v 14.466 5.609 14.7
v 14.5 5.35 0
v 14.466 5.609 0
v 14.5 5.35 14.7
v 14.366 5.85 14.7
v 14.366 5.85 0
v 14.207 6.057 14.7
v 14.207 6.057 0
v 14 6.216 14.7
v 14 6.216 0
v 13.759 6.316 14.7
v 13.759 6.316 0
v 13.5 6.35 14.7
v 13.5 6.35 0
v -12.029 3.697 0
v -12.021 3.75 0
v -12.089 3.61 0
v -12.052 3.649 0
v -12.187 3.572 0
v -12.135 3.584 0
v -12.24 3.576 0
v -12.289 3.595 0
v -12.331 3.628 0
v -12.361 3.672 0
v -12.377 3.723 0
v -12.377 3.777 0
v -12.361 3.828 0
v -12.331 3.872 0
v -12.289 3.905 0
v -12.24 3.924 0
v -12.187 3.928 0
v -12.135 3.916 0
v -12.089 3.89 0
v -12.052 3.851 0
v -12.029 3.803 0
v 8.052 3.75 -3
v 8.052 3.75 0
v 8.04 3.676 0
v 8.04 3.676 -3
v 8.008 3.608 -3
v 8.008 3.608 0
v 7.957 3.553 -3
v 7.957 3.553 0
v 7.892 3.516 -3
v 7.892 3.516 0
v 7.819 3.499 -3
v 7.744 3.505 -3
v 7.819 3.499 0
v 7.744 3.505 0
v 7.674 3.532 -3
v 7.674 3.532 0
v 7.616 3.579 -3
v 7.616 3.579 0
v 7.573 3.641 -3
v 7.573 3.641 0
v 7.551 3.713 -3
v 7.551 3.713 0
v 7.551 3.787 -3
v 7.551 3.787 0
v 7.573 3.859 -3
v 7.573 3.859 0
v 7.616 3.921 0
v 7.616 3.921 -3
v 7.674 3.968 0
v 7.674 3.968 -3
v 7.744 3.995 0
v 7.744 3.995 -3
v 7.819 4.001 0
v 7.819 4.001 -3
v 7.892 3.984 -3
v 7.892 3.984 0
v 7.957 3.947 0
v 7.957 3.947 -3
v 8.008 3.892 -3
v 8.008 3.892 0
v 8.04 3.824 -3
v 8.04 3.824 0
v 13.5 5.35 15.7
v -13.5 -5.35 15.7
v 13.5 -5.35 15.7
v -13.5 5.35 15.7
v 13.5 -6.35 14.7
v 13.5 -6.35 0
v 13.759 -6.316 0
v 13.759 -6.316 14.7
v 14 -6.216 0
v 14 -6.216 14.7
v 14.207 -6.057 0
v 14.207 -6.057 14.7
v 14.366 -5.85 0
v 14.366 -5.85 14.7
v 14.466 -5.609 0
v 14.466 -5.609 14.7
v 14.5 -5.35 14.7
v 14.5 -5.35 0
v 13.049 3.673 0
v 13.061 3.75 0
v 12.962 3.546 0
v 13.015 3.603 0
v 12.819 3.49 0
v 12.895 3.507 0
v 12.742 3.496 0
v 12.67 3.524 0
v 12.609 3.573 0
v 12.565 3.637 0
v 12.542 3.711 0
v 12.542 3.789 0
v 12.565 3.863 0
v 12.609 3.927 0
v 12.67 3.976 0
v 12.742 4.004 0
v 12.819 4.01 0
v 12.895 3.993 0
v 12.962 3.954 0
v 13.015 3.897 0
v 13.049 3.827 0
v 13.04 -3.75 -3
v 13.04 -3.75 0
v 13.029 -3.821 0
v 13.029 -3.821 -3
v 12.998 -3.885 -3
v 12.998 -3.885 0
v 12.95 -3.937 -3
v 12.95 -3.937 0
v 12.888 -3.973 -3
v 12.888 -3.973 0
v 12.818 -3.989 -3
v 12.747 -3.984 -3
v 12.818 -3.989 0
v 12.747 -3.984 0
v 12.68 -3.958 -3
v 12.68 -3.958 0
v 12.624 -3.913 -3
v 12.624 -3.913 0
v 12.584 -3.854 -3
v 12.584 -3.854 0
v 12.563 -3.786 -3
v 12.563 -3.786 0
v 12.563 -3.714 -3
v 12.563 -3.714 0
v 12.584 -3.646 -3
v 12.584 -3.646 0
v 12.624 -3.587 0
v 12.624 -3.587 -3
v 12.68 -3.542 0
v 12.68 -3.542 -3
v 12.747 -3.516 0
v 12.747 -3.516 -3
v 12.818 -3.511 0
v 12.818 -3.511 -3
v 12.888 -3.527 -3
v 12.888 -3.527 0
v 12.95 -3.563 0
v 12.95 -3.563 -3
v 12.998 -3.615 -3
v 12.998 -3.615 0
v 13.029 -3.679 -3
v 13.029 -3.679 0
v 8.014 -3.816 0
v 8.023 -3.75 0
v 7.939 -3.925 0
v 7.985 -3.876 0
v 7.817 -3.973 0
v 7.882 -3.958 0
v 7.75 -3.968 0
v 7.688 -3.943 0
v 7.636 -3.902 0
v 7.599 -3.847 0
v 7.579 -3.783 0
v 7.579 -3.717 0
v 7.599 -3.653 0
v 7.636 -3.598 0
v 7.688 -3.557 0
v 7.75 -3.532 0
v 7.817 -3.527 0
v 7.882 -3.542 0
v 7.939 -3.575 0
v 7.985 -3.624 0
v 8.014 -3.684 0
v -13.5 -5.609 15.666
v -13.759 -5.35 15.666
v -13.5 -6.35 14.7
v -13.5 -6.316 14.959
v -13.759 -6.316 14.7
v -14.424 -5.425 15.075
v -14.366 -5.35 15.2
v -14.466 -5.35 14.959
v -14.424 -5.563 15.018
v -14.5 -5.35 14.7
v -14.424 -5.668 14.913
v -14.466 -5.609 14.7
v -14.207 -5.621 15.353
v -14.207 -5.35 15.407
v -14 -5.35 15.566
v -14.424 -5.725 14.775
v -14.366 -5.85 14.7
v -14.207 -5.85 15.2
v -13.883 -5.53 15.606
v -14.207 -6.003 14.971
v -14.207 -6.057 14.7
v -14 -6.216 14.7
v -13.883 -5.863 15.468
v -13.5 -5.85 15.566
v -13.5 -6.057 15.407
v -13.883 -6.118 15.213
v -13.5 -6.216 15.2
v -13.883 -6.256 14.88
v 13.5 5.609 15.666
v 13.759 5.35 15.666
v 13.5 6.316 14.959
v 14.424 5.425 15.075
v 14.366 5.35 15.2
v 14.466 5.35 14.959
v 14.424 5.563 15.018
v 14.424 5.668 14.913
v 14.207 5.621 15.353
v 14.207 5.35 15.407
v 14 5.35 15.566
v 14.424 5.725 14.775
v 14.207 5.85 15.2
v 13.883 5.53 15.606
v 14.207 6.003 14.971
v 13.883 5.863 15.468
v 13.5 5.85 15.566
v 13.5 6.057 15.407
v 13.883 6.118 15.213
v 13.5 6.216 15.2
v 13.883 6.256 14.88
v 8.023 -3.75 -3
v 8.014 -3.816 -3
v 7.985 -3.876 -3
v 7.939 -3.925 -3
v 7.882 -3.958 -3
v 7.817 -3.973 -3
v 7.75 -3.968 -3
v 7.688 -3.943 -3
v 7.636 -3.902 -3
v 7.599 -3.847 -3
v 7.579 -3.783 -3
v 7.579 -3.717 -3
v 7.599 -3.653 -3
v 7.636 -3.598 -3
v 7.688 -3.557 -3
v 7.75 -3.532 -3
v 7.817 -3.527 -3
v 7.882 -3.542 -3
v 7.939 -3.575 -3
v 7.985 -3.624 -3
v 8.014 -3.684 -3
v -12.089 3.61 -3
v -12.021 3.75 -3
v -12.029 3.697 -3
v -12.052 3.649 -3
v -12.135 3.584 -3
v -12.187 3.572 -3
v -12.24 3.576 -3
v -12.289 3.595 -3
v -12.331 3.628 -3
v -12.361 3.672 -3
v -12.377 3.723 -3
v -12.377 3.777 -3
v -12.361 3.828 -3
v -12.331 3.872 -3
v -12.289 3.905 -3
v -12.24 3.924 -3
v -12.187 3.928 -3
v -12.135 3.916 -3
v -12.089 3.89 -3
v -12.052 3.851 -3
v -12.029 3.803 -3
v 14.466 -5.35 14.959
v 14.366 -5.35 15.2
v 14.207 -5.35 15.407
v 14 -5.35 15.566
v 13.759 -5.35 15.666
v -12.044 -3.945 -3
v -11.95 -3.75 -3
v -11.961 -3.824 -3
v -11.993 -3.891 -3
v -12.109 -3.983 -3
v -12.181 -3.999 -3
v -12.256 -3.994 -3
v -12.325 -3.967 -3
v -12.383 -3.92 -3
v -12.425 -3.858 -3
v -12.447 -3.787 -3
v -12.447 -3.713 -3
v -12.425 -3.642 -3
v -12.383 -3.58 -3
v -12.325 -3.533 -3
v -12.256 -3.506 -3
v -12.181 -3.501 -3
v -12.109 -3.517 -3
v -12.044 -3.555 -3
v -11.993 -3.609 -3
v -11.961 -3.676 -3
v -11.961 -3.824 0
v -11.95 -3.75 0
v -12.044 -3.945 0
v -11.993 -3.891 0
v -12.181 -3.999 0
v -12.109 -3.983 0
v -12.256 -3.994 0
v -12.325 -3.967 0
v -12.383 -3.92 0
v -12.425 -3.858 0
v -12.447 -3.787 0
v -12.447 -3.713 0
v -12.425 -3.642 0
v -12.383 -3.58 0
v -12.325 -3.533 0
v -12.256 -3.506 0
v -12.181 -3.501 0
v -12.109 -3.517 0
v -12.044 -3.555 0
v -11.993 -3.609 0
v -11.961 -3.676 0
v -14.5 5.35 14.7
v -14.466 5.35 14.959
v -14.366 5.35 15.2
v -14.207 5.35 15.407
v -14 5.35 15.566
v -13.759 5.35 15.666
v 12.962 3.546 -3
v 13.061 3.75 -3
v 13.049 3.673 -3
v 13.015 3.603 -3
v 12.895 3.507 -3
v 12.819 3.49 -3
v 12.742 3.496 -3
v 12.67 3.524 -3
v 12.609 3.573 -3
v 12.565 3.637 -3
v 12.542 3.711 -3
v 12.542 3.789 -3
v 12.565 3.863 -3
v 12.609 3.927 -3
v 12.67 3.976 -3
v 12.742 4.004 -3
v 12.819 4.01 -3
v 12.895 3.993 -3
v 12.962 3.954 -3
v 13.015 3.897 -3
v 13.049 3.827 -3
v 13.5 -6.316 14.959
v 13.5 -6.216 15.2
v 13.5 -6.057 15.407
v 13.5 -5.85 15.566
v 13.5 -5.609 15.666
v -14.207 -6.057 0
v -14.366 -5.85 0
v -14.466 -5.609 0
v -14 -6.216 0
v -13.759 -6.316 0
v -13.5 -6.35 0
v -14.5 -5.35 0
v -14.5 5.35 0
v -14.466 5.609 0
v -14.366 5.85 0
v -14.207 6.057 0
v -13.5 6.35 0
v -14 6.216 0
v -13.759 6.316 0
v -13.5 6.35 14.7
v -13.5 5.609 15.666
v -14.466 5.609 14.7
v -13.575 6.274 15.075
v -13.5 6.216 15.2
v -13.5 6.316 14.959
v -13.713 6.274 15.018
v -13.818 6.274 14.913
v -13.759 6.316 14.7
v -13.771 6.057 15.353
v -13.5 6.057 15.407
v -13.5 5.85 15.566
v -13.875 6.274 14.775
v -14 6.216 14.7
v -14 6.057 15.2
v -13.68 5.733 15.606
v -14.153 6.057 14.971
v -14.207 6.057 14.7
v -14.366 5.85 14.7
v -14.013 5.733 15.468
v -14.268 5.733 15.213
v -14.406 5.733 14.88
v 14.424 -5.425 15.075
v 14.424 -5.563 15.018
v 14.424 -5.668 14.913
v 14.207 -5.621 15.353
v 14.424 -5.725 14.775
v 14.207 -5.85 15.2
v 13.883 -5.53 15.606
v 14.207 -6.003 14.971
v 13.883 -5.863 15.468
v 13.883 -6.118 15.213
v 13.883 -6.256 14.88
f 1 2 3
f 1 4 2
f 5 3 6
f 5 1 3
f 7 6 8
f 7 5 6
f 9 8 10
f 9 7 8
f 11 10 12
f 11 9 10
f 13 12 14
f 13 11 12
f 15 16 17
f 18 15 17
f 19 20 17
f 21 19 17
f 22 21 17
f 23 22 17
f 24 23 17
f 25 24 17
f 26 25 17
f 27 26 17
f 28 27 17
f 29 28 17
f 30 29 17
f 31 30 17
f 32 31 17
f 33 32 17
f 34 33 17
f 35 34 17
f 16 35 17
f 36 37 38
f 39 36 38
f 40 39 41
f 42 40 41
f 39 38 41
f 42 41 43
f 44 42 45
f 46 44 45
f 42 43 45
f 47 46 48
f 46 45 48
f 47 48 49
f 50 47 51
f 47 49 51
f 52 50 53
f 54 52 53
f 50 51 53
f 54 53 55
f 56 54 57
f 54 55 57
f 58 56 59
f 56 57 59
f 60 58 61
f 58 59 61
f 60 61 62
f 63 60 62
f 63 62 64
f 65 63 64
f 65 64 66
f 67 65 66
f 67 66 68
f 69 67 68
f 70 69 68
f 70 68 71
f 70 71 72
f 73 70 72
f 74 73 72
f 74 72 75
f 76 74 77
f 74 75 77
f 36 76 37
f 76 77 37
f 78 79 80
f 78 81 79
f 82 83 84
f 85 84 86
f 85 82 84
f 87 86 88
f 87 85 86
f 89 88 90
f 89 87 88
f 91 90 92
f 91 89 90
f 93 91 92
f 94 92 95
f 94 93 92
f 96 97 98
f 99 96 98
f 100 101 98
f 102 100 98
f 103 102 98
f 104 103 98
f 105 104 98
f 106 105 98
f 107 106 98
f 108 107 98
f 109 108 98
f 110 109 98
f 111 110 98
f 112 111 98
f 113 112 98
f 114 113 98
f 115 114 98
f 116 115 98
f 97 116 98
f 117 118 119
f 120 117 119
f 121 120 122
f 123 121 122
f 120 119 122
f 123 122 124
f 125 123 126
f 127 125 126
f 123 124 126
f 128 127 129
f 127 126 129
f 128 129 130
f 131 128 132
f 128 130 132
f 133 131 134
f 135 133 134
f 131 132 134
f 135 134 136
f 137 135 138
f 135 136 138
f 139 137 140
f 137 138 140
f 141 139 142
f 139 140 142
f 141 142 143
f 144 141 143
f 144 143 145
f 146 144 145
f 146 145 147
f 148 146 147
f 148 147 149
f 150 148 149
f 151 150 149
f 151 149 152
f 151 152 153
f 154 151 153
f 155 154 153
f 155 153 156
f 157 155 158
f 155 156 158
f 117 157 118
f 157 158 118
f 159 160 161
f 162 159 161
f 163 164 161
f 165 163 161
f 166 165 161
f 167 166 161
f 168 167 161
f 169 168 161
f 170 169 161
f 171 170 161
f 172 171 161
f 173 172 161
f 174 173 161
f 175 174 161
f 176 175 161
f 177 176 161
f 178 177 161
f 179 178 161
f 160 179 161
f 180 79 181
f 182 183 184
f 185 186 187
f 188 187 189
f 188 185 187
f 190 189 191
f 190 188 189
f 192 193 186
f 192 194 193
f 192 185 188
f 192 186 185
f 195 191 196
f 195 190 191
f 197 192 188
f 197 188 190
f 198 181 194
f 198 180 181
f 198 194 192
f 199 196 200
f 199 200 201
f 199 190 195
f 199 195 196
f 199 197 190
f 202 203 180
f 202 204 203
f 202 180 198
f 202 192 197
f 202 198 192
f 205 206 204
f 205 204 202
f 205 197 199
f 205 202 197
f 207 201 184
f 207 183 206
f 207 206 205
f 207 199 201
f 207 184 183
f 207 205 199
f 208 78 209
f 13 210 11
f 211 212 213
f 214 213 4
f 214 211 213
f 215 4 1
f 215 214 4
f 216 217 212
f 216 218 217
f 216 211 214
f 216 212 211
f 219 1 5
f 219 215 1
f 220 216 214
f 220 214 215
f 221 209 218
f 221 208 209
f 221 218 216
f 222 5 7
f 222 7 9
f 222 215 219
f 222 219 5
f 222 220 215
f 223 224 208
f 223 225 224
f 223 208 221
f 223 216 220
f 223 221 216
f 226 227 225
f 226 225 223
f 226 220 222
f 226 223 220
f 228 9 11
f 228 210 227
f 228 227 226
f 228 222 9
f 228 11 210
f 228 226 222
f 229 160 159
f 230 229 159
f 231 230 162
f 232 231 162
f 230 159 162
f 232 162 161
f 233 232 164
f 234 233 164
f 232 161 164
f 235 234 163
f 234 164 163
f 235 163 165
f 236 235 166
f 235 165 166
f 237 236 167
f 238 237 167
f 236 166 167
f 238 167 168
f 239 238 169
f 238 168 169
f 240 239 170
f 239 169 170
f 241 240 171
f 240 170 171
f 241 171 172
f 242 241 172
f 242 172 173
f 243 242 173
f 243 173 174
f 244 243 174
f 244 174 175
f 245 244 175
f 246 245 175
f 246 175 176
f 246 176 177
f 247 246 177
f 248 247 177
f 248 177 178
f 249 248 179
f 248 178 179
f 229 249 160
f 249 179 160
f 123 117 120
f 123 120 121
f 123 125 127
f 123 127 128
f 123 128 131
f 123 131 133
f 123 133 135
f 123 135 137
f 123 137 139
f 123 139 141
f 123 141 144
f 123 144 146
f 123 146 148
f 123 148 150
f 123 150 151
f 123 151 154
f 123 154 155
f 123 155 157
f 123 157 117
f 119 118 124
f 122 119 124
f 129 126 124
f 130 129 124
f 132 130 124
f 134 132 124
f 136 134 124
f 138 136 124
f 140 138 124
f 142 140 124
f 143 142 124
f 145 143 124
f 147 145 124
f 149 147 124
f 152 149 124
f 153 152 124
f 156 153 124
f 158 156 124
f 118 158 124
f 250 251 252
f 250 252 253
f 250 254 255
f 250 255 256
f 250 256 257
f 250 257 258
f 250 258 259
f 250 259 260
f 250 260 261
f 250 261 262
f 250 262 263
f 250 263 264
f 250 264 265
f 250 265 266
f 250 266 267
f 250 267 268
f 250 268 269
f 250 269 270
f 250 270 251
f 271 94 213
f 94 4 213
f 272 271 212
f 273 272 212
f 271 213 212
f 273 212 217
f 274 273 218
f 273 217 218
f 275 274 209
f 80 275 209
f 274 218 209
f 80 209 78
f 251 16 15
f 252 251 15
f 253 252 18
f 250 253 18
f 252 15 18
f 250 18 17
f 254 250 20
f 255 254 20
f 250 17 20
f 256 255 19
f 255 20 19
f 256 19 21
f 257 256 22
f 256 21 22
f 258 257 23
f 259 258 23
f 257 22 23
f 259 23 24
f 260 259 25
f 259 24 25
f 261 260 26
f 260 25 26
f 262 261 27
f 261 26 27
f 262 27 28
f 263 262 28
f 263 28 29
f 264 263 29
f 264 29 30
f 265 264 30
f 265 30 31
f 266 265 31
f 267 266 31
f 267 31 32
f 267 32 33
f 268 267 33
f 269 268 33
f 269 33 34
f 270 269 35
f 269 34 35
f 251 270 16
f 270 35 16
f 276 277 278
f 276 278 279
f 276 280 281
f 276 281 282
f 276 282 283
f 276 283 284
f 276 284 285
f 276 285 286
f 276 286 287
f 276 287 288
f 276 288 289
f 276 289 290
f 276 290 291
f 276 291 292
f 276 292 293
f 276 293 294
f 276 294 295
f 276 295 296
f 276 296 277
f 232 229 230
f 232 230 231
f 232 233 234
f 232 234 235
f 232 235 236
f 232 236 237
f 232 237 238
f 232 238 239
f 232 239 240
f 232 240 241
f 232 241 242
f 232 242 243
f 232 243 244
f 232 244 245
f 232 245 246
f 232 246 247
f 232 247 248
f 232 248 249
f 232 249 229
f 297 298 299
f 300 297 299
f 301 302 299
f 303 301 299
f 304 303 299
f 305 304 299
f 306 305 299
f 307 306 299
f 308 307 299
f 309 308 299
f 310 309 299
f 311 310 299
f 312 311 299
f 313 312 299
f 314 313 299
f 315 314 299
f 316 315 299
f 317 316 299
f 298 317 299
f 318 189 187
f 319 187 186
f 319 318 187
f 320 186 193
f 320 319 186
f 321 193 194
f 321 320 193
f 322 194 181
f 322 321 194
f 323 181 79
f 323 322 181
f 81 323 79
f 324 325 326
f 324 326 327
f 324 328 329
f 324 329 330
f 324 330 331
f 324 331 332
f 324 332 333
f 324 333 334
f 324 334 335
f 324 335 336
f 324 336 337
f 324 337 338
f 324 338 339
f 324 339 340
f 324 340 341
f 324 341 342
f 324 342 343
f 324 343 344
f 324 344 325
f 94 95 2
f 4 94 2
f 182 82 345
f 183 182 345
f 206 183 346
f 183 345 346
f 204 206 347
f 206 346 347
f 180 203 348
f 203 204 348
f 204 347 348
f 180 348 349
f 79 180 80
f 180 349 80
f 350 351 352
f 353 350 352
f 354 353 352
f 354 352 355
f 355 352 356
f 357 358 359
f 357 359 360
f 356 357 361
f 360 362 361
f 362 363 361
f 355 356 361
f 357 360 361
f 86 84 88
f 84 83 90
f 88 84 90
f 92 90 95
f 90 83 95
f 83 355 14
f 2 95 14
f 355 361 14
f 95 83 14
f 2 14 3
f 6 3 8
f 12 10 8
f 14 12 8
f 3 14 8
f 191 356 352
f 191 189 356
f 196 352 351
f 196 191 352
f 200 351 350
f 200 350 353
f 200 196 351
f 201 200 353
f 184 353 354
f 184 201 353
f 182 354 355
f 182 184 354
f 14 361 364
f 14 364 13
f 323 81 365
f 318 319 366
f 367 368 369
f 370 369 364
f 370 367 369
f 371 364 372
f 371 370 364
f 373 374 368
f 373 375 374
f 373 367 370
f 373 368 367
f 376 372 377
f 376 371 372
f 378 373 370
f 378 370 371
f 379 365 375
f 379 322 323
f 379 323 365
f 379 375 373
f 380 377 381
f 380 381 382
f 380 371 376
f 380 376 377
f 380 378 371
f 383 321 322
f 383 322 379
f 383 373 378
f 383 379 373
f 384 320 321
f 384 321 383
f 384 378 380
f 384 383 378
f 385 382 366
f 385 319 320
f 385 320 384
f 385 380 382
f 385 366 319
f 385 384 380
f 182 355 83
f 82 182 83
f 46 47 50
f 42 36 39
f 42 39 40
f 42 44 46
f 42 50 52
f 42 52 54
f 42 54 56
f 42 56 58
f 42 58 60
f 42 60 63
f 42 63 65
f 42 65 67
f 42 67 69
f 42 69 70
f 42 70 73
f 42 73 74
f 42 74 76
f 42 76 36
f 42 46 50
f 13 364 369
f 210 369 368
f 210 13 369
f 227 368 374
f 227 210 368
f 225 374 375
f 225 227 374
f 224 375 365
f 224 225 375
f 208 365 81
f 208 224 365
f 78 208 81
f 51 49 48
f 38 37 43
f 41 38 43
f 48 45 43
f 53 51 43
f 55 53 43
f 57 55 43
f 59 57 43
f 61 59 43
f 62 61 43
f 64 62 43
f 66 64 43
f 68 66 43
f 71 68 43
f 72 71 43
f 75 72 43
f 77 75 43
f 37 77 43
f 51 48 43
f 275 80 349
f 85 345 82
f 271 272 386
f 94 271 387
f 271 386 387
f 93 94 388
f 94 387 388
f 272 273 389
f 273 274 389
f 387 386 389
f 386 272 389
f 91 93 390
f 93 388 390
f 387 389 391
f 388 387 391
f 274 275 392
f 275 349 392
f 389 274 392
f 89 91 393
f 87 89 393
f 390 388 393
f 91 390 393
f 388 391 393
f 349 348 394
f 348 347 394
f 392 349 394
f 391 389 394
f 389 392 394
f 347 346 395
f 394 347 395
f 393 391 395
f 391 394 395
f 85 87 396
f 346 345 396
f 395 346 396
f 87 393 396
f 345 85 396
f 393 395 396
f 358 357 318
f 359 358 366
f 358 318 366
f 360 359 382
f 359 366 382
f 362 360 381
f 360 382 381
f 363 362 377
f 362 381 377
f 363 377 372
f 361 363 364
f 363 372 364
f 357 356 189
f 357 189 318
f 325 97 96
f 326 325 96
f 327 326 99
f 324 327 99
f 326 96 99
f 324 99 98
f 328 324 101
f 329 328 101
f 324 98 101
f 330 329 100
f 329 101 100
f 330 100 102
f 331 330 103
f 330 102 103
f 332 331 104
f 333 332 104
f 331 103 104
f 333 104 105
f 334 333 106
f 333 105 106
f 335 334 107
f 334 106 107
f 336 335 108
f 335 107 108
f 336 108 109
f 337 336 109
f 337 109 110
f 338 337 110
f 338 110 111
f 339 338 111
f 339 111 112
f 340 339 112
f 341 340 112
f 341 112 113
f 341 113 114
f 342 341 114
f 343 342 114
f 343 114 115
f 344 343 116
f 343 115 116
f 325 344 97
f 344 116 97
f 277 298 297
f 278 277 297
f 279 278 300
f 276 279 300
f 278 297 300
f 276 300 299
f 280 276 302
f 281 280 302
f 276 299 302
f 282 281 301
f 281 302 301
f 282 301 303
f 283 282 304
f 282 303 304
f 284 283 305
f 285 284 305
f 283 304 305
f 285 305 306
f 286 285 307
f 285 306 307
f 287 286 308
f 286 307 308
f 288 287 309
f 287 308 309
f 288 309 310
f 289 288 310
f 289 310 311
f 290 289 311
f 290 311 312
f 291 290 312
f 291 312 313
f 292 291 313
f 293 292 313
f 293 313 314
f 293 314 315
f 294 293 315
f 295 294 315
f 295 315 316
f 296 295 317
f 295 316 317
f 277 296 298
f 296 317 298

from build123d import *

# Parameters (mm, degrees)
F0_W     = 29
F0_H     = 12.7
F1_DEPTH = 15.7
F2_R     = 0.25
F2_R_2   = 0.178743
F2_R_3   = 0.223428
F2_R_4   = 0.239808
F2_R_5   = 0.251593
F2_R_6   = 0.26056
F3_DEPTH = 3
F4_R     = 1


with BuildPart() as f1:
    # F0 (on Top) → F1 (new body)
    with BuildSketch(Plane.XY):
        Rectangle(F0_W, F0_H)
    extrude(amount=F1_DEPTH)

    # F4
    f4_edges = [f1.edges().sort_by_distance(p)[0] for p in [
        (0, -6.35, 15.7),
        (-14.5, 0, 15.7),
        (0, 6.35, 15.7),
        (14.5, 0, 15.7),
        (14.5, -6.35, 7.85),
        (14.5, 6.35, 7.85),
        (-14.5, -6.35, 7.85),
        (-14.5, 6.35, 7.85),
    ]]
    fillet(f4_edges, radius=F4_R)


with BuildPart() as f3:
    # F2 (on face) → F3 (new body)
    with BuildSketch(Plane(origin=(0, 0, 0), x_dir=(1, 0, 0), z_dir=(0, 0, -1))):
        with Locations((-12.2, 3.75)):
            Circle(F2_R)
        with Locations((-12.2, -3.75)):
            Circle(F2_R_2)
        with Locations((7.8, 3.75)):
            Circle(F2_R_3)
        with Locations((12.8, 3.75)):
            Circle(F2_R_4)
        with Locations((7.8, -3.75)):
            Circle(F2_R_5)
        with Locations((12.8, -3.75)):
            Circle(F2_R_6)
    extrude(amount=F3_DEPTH)


solid = Compound([f1.part, f3.part])
